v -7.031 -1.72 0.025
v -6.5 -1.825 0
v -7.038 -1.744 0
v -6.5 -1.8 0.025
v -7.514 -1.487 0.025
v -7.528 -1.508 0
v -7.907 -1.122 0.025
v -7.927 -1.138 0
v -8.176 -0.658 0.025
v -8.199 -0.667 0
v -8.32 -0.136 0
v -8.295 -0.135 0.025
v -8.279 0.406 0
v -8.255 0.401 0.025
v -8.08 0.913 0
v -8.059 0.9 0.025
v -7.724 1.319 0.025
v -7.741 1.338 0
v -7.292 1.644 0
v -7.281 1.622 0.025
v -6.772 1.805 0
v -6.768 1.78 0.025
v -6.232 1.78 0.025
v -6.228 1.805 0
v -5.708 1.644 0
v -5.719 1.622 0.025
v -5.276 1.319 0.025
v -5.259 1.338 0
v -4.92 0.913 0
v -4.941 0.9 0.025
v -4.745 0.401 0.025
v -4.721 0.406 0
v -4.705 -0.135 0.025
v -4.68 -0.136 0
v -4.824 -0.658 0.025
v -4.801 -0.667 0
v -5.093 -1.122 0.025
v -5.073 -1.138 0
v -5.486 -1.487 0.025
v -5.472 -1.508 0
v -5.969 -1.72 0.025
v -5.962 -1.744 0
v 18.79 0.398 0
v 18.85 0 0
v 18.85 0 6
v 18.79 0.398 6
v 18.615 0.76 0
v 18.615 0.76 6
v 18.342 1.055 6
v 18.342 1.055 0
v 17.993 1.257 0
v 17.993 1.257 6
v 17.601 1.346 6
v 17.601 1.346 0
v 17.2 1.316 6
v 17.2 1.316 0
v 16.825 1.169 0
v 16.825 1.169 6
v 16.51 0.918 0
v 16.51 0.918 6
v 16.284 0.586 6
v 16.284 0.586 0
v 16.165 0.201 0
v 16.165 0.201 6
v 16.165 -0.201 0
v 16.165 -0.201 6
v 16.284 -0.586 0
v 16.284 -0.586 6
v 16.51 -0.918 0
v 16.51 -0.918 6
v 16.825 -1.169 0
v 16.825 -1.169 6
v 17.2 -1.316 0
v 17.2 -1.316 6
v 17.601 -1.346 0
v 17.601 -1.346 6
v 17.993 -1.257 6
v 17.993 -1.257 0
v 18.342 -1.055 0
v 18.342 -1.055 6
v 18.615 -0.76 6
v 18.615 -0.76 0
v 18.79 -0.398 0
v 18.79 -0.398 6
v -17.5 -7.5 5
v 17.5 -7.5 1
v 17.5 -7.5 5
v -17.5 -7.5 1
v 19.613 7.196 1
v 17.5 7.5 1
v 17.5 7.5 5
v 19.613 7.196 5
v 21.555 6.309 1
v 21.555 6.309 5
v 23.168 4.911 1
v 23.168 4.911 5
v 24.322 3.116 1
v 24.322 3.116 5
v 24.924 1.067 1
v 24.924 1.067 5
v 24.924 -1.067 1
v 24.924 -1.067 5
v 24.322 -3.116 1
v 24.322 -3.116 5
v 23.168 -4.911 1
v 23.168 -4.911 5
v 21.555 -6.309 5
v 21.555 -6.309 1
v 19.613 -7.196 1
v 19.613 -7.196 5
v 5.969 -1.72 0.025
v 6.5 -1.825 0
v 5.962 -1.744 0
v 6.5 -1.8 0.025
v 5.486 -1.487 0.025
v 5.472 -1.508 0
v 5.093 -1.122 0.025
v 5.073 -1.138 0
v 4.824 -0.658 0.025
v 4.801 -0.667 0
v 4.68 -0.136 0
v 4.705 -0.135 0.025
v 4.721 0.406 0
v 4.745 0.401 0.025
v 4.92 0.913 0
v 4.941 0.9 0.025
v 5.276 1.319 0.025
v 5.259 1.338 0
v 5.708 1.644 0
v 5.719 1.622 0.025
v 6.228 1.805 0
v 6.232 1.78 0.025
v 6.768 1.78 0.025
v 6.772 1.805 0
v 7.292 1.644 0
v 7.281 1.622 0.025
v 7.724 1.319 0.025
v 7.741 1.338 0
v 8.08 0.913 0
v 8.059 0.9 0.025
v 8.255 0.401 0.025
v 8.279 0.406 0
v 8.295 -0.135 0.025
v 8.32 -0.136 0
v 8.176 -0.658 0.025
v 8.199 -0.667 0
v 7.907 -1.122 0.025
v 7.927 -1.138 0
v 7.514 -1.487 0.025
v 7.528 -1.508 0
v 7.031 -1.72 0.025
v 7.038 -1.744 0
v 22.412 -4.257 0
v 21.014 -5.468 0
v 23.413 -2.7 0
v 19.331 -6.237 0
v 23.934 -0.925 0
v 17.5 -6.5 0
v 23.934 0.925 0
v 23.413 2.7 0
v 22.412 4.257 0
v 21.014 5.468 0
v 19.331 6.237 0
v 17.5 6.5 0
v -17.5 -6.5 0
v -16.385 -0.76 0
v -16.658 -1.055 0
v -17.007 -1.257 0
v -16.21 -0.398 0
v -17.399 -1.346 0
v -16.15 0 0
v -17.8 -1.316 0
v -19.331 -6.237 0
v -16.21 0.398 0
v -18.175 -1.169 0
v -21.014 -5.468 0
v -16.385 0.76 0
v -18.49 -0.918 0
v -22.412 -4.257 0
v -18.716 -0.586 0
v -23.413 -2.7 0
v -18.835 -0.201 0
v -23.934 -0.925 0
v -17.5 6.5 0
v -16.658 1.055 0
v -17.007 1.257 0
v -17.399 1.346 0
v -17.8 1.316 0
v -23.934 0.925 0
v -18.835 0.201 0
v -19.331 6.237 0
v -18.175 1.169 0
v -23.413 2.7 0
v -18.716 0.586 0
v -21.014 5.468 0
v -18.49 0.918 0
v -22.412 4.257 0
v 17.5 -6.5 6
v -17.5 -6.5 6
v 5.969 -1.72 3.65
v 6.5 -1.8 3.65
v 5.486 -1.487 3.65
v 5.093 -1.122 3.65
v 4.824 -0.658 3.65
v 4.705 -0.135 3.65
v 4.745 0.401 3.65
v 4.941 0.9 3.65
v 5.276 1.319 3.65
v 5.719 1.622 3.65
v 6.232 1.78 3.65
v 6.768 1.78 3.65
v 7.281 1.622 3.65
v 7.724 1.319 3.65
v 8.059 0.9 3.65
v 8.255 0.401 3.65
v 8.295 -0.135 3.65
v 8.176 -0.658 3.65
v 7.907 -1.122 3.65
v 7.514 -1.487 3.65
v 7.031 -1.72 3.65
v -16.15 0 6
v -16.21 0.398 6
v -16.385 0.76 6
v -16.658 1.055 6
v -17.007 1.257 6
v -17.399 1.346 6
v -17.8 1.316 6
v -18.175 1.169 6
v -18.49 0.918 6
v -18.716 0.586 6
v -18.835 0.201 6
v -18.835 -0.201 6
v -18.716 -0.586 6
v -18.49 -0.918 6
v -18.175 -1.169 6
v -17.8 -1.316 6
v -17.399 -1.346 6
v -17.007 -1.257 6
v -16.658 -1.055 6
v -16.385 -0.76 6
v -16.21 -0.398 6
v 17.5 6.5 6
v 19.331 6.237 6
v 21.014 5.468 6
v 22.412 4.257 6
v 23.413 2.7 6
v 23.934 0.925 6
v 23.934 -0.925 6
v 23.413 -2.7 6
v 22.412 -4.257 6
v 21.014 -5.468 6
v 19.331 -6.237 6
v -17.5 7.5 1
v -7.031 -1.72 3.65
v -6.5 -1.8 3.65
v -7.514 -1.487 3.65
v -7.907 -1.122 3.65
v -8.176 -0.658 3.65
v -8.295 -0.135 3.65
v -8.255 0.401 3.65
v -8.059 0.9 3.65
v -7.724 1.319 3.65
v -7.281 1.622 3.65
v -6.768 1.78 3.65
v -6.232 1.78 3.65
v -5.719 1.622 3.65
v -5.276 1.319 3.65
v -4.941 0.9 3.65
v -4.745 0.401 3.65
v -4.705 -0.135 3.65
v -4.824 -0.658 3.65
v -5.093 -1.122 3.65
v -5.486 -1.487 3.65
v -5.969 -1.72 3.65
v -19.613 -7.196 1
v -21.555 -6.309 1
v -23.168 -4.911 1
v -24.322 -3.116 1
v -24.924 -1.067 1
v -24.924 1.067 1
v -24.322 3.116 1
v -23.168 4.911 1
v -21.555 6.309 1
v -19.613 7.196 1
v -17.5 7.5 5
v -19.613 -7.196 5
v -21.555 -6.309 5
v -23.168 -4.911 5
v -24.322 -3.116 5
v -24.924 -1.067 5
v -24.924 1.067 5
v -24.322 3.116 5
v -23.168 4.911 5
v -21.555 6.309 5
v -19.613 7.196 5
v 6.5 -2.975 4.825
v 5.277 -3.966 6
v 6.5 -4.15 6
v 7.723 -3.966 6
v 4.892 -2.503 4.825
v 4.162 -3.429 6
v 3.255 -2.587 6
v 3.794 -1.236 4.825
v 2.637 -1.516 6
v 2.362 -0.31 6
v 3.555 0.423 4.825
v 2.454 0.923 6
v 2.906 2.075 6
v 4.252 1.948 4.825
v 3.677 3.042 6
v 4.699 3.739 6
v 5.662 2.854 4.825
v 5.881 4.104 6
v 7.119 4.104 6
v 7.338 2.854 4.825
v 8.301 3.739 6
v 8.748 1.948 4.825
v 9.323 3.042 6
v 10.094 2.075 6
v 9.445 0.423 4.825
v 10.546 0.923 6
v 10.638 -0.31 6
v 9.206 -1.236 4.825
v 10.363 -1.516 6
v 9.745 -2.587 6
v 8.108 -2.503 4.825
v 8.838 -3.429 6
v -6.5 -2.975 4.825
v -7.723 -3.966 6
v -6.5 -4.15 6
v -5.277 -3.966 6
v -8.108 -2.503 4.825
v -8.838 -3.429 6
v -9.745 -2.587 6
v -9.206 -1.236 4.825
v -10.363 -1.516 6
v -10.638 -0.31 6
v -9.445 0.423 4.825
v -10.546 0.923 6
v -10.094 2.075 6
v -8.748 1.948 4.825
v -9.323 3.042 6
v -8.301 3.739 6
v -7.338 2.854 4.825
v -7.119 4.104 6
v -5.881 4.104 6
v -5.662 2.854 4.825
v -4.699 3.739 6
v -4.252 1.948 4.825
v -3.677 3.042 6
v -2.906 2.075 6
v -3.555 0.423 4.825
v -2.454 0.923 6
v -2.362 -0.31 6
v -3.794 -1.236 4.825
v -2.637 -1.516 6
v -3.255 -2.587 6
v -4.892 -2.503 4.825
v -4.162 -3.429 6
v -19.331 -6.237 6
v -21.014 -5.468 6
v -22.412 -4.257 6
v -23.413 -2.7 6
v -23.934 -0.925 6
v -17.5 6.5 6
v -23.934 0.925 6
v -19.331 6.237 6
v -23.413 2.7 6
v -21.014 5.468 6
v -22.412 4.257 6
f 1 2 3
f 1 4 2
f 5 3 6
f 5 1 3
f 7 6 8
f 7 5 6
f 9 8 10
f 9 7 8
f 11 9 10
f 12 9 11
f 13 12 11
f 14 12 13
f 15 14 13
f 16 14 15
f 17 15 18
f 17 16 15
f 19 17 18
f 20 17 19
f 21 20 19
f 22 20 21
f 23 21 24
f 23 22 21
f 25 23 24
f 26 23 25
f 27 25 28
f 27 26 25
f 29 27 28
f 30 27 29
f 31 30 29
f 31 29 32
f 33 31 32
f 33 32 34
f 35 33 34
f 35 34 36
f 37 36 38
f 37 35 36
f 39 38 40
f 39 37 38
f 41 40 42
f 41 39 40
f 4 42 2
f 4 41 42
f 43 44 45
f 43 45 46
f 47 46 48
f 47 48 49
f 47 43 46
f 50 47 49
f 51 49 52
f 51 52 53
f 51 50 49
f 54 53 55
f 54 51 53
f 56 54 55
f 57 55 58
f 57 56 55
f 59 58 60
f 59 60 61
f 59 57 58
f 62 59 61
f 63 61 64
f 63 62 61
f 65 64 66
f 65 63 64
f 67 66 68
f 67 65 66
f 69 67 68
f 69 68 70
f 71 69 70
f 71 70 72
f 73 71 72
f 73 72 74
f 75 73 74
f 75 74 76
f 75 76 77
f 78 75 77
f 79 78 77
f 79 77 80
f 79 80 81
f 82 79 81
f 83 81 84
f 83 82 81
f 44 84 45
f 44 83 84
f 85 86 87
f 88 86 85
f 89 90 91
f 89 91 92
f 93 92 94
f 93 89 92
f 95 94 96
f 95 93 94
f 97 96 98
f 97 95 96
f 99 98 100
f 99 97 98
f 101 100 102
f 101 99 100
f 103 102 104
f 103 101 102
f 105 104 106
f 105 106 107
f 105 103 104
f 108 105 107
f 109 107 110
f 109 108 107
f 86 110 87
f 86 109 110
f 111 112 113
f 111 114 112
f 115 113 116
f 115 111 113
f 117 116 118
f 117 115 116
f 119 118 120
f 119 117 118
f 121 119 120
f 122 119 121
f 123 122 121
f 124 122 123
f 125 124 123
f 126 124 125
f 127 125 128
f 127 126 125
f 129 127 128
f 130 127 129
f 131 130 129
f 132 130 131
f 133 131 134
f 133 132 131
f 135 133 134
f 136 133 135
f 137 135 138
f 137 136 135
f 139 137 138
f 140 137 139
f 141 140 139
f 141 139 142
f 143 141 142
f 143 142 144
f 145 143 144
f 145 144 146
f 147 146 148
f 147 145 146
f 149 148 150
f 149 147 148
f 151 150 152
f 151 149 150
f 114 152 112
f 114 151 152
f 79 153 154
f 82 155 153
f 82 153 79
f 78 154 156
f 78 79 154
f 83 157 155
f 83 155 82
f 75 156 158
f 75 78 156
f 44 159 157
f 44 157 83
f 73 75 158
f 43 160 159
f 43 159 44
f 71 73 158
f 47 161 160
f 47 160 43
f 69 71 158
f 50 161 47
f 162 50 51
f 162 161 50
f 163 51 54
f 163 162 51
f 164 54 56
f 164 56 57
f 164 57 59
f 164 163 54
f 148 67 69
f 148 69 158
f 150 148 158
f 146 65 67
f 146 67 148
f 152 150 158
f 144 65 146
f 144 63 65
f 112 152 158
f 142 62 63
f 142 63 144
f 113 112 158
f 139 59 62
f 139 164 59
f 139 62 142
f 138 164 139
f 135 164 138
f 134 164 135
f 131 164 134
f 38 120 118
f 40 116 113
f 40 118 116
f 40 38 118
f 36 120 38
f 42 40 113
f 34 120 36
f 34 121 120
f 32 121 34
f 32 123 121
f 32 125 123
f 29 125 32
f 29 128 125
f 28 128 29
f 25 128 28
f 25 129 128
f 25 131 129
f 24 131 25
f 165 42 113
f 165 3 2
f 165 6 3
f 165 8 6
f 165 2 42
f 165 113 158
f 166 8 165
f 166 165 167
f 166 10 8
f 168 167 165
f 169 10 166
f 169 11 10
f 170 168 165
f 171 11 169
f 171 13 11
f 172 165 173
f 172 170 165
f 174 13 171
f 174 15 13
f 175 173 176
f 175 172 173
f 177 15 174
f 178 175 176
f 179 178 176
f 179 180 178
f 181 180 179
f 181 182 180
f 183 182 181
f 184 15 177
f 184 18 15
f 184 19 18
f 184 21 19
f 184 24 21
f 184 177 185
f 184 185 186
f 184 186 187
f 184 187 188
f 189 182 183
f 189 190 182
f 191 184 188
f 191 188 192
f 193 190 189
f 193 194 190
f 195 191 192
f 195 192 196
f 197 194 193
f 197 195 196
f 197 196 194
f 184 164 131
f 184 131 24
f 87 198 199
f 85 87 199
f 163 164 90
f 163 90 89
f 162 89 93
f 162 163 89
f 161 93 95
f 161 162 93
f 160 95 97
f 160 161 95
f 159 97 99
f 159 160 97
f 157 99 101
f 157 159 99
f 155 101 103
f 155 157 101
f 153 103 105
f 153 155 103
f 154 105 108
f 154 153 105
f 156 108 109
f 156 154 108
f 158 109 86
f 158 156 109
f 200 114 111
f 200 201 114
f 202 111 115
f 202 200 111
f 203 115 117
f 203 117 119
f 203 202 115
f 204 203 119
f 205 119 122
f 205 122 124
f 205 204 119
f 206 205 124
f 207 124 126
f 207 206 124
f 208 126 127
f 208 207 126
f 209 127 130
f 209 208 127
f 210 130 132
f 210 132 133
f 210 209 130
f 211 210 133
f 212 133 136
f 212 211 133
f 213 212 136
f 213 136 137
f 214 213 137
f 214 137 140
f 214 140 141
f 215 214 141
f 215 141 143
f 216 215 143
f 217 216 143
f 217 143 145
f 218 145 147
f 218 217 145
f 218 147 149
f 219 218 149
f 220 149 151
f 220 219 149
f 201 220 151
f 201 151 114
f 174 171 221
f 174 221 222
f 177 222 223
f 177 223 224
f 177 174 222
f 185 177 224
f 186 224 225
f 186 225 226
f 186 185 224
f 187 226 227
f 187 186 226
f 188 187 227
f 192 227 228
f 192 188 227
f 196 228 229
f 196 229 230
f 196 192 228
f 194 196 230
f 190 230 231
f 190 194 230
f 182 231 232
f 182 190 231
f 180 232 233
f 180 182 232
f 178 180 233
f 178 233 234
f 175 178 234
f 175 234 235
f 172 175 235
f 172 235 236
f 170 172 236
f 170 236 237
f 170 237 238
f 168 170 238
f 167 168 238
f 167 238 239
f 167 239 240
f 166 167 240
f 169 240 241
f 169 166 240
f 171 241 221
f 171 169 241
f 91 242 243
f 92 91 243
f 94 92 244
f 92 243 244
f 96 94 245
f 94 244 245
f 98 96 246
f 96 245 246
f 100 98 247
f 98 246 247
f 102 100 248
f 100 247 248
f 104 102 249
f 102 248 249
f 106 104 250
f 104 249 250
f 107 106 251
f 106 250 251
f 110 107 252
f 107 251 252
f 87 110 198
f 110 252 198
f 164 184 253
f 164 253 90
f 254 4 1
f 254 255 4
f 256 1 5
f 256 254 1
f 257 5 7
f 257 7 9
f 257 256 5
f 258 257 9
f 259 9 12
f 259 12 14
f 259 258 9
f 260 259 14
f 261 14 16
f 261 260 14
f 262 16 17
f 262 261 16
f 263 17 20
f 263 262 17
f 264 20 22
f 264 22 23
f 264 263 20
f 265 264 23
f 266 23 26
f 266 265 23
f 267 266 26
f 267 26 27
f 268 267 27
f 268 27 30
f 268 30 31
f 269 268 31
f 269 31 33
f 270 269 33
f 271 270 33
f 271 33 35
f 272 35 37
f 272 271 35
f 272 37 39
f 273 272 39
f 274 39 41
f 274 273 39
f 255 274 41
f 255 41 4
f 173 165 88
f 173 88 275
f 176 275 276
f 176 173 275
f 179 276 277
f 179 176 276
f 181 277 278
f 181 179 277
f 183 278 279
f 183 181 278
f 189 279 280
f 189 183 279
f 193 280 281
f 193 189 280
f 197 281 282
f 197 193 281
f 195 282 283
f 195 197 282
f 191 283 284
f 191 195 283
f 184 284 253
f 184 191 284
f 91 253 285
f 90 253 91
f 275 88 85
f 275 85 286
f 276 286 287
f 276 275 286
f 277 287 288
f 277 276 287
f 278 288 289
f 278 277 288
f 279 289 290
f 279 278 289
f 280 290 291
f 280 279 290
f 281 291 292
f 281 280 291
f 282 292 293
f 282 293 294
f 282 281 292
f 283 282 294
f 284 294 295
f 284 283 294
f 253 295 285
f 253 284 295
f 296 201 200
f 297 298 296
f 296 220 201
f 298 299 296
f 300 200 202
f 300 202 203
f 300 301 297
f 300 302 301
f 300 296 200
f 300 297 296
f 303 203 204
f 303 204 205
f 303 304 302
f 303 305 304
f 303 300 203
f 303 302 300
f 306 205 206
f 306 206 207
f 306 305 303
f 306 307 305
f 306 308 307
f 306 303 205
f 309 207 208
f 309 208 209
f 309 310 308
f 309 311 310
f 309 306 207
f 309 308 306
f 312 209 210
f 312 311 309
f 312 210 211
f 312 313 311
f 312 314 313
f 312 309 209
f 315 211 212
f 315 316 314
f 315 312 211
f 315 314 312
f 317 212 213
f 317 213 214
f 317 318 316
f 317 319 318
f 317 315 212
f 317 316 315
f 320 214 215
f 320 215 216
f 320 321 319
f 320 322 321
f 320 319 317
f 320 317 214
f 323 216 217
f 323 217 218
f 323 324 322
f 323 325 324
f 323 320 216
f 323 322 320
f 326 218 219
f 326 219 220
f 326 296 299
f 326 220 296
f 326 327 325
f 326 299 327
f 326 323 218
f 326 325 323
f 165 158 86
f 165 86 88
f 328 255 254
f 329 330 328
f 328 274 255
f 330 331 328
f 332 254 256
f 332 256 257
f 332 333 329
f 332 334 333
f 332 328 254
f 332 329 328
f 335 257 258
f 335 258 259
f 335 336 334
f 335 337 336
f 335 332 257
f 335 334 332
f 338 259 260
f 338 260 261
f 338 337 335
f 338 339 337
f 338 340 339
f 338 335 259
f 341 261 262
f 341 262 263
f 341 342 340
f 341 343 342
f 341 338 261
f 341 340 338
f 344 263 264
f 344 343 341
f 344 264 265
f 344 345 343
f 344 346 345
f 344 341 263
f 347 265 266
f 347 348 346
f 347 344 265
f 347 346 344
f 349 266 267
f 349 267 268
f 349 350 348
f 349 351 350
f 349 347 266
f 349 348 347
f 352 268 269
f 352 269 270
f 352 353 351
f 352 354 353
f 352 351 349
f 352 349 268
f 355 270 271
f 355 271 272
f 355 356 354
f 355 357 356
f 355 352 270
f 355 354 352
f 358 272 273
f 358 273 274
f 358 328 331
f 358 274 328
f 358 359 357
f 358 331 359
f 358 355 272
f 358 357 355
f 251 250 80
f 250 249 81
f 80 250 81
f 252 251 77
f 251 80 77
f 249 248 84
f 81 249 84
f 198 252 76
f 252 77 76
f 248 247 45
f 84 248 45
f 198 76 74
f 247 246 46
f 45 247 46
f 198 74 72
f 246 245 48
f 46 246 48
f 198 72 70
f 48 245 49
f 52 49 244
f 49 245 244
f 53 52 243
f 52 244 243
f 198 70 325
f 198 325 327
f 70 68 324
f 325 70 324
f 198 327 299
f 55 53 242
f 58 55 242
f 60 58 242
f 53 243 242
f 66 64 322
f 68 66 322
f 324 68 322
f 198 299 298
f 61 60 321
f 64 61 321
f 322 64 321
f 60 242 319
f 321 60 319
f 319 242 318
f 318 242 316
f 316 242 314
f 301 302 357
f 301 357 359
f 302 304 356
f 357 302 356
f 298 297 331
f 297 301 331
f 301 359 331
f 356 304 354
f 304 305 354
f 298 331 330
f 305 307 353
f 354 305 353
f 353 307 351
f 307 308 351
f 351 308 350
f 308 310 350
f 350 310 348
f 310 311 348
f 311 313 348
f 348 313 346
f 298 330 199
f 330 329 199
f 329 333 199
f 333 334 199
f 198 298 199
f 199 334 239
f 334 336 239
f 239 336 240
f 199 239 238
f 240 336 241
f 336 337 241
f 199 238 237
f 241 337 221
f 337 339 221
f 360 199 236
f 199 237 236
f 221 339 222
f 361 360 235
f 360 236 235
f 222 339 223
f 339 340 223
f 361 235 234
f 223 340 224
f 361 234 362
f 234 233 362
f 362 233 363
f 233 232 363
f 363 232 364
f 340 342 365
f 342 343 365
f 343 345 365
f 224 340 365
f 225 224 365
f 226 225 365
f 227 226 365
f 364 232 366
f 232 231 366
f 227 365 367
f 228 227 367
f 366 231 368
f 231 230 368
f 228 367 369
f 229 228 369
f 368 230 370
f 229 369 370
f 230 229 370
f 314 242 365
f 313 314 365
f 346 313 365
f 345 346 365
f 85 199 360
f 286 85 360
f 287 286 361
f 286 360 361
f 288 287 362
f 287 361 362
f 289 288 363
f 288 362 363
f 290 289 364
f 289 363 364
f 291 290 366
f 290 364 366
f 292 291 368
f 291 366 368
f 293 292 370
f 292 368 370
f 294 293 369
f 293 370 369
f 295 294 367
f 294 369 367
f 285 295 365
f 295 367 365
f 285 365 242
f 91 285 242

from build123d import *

# Parameters (mm, degrees)
SKETCH1_R                                    = 1.35
BOSS_EXTRUDE1_DEPTH                          = 6
CHAMFER1_SIZE                                = 1
CSK_FOR_M3_COUNTERSUNK_FLAT_HEAD_SCR_2_COUNT = 2
CSK_FOR_M3_COUNTERSUNK_FLAT_HEAD_SCR_2_PITCH = 13


with BuildPart() as part:
    # Sketch1 → Boss-Extrude1 (new body)
    with BuildSketch(Plane.XY):
        with BuildLine():
            Line((-17.5, 7.5), (17.5, 7.5))
            ThreePointArc((17.5, 7.5), (25, 0), (17.5, -7.5))
            Line((17.5, -7.5), (-17.5, -7.5))
            ThreePointArc((-17.5, -7.5), (-25, 0), (-17.5, 7.5))
        make_face()
        with Locations((-17.5, 0)):
            Circle(SKETCH1_R, mode=Mode.SUBTRACT)
        with Locations((17.5, 0)):
            Circle(SKETCH1_R, mode=Mode.SUBTRACT)
    extrude(amount=BOSS_EXTRUDE1_DEPTH)

    # Chamfer1
    chamfer1_edges = [part.edges().sort_by_distance(p)[0] for p in [
        (25, 0, 6),
        (0, 7.5, 6),
        (-25, 0, 6),
        (0, 7.5, 0),
        (25, 0, 0),
        (0, -7.5, 0),
        (-25, 0, 0),
        (0, -7.5, 6),
    ]]
    chamfer(chamfer1_edges, length=CHAMFER1_SIZE)

    # Sketch3 → CSK for M3 Countersunk Flat Head Screw1 (revolve, cut)
    with BuildSketch(Plane(origin=(6.5, 0, 6), x_dir=(0, -1, 0), z_dir=(1, 0, 0))):
        Polygon((0, 0), (0, 6), (1.825, 6), (1.8, 5.975), (1.8, 2.35), (4.15, 0), align=None)
    csk_for_m3_countersunk_flat_head_screw1 = revolve(axis=Axis((6.5, 0, 12.35), (0, 0, -1)), mode=Mode.SUBTRACT)

    # CSK for M3 Countersunk Flat Head Scr 2: CSK for M3 Countersunk Flat Head Screw1 ×2
    with Locations(*[(-i * CSK_FOR_M3_COUNTERSUNK_FLAT_HEAD_SCR_2_PITCH, 0, 0) for i in range(1, CSK_FOR_M3_COUNTERSUNK_FLAT_HEAD_SCR_2_COUNT)]):
        add(csk_for_m3_countersunk_flat_head_screw1, mode=Mode.SUBTRACT)


solid = part.part
